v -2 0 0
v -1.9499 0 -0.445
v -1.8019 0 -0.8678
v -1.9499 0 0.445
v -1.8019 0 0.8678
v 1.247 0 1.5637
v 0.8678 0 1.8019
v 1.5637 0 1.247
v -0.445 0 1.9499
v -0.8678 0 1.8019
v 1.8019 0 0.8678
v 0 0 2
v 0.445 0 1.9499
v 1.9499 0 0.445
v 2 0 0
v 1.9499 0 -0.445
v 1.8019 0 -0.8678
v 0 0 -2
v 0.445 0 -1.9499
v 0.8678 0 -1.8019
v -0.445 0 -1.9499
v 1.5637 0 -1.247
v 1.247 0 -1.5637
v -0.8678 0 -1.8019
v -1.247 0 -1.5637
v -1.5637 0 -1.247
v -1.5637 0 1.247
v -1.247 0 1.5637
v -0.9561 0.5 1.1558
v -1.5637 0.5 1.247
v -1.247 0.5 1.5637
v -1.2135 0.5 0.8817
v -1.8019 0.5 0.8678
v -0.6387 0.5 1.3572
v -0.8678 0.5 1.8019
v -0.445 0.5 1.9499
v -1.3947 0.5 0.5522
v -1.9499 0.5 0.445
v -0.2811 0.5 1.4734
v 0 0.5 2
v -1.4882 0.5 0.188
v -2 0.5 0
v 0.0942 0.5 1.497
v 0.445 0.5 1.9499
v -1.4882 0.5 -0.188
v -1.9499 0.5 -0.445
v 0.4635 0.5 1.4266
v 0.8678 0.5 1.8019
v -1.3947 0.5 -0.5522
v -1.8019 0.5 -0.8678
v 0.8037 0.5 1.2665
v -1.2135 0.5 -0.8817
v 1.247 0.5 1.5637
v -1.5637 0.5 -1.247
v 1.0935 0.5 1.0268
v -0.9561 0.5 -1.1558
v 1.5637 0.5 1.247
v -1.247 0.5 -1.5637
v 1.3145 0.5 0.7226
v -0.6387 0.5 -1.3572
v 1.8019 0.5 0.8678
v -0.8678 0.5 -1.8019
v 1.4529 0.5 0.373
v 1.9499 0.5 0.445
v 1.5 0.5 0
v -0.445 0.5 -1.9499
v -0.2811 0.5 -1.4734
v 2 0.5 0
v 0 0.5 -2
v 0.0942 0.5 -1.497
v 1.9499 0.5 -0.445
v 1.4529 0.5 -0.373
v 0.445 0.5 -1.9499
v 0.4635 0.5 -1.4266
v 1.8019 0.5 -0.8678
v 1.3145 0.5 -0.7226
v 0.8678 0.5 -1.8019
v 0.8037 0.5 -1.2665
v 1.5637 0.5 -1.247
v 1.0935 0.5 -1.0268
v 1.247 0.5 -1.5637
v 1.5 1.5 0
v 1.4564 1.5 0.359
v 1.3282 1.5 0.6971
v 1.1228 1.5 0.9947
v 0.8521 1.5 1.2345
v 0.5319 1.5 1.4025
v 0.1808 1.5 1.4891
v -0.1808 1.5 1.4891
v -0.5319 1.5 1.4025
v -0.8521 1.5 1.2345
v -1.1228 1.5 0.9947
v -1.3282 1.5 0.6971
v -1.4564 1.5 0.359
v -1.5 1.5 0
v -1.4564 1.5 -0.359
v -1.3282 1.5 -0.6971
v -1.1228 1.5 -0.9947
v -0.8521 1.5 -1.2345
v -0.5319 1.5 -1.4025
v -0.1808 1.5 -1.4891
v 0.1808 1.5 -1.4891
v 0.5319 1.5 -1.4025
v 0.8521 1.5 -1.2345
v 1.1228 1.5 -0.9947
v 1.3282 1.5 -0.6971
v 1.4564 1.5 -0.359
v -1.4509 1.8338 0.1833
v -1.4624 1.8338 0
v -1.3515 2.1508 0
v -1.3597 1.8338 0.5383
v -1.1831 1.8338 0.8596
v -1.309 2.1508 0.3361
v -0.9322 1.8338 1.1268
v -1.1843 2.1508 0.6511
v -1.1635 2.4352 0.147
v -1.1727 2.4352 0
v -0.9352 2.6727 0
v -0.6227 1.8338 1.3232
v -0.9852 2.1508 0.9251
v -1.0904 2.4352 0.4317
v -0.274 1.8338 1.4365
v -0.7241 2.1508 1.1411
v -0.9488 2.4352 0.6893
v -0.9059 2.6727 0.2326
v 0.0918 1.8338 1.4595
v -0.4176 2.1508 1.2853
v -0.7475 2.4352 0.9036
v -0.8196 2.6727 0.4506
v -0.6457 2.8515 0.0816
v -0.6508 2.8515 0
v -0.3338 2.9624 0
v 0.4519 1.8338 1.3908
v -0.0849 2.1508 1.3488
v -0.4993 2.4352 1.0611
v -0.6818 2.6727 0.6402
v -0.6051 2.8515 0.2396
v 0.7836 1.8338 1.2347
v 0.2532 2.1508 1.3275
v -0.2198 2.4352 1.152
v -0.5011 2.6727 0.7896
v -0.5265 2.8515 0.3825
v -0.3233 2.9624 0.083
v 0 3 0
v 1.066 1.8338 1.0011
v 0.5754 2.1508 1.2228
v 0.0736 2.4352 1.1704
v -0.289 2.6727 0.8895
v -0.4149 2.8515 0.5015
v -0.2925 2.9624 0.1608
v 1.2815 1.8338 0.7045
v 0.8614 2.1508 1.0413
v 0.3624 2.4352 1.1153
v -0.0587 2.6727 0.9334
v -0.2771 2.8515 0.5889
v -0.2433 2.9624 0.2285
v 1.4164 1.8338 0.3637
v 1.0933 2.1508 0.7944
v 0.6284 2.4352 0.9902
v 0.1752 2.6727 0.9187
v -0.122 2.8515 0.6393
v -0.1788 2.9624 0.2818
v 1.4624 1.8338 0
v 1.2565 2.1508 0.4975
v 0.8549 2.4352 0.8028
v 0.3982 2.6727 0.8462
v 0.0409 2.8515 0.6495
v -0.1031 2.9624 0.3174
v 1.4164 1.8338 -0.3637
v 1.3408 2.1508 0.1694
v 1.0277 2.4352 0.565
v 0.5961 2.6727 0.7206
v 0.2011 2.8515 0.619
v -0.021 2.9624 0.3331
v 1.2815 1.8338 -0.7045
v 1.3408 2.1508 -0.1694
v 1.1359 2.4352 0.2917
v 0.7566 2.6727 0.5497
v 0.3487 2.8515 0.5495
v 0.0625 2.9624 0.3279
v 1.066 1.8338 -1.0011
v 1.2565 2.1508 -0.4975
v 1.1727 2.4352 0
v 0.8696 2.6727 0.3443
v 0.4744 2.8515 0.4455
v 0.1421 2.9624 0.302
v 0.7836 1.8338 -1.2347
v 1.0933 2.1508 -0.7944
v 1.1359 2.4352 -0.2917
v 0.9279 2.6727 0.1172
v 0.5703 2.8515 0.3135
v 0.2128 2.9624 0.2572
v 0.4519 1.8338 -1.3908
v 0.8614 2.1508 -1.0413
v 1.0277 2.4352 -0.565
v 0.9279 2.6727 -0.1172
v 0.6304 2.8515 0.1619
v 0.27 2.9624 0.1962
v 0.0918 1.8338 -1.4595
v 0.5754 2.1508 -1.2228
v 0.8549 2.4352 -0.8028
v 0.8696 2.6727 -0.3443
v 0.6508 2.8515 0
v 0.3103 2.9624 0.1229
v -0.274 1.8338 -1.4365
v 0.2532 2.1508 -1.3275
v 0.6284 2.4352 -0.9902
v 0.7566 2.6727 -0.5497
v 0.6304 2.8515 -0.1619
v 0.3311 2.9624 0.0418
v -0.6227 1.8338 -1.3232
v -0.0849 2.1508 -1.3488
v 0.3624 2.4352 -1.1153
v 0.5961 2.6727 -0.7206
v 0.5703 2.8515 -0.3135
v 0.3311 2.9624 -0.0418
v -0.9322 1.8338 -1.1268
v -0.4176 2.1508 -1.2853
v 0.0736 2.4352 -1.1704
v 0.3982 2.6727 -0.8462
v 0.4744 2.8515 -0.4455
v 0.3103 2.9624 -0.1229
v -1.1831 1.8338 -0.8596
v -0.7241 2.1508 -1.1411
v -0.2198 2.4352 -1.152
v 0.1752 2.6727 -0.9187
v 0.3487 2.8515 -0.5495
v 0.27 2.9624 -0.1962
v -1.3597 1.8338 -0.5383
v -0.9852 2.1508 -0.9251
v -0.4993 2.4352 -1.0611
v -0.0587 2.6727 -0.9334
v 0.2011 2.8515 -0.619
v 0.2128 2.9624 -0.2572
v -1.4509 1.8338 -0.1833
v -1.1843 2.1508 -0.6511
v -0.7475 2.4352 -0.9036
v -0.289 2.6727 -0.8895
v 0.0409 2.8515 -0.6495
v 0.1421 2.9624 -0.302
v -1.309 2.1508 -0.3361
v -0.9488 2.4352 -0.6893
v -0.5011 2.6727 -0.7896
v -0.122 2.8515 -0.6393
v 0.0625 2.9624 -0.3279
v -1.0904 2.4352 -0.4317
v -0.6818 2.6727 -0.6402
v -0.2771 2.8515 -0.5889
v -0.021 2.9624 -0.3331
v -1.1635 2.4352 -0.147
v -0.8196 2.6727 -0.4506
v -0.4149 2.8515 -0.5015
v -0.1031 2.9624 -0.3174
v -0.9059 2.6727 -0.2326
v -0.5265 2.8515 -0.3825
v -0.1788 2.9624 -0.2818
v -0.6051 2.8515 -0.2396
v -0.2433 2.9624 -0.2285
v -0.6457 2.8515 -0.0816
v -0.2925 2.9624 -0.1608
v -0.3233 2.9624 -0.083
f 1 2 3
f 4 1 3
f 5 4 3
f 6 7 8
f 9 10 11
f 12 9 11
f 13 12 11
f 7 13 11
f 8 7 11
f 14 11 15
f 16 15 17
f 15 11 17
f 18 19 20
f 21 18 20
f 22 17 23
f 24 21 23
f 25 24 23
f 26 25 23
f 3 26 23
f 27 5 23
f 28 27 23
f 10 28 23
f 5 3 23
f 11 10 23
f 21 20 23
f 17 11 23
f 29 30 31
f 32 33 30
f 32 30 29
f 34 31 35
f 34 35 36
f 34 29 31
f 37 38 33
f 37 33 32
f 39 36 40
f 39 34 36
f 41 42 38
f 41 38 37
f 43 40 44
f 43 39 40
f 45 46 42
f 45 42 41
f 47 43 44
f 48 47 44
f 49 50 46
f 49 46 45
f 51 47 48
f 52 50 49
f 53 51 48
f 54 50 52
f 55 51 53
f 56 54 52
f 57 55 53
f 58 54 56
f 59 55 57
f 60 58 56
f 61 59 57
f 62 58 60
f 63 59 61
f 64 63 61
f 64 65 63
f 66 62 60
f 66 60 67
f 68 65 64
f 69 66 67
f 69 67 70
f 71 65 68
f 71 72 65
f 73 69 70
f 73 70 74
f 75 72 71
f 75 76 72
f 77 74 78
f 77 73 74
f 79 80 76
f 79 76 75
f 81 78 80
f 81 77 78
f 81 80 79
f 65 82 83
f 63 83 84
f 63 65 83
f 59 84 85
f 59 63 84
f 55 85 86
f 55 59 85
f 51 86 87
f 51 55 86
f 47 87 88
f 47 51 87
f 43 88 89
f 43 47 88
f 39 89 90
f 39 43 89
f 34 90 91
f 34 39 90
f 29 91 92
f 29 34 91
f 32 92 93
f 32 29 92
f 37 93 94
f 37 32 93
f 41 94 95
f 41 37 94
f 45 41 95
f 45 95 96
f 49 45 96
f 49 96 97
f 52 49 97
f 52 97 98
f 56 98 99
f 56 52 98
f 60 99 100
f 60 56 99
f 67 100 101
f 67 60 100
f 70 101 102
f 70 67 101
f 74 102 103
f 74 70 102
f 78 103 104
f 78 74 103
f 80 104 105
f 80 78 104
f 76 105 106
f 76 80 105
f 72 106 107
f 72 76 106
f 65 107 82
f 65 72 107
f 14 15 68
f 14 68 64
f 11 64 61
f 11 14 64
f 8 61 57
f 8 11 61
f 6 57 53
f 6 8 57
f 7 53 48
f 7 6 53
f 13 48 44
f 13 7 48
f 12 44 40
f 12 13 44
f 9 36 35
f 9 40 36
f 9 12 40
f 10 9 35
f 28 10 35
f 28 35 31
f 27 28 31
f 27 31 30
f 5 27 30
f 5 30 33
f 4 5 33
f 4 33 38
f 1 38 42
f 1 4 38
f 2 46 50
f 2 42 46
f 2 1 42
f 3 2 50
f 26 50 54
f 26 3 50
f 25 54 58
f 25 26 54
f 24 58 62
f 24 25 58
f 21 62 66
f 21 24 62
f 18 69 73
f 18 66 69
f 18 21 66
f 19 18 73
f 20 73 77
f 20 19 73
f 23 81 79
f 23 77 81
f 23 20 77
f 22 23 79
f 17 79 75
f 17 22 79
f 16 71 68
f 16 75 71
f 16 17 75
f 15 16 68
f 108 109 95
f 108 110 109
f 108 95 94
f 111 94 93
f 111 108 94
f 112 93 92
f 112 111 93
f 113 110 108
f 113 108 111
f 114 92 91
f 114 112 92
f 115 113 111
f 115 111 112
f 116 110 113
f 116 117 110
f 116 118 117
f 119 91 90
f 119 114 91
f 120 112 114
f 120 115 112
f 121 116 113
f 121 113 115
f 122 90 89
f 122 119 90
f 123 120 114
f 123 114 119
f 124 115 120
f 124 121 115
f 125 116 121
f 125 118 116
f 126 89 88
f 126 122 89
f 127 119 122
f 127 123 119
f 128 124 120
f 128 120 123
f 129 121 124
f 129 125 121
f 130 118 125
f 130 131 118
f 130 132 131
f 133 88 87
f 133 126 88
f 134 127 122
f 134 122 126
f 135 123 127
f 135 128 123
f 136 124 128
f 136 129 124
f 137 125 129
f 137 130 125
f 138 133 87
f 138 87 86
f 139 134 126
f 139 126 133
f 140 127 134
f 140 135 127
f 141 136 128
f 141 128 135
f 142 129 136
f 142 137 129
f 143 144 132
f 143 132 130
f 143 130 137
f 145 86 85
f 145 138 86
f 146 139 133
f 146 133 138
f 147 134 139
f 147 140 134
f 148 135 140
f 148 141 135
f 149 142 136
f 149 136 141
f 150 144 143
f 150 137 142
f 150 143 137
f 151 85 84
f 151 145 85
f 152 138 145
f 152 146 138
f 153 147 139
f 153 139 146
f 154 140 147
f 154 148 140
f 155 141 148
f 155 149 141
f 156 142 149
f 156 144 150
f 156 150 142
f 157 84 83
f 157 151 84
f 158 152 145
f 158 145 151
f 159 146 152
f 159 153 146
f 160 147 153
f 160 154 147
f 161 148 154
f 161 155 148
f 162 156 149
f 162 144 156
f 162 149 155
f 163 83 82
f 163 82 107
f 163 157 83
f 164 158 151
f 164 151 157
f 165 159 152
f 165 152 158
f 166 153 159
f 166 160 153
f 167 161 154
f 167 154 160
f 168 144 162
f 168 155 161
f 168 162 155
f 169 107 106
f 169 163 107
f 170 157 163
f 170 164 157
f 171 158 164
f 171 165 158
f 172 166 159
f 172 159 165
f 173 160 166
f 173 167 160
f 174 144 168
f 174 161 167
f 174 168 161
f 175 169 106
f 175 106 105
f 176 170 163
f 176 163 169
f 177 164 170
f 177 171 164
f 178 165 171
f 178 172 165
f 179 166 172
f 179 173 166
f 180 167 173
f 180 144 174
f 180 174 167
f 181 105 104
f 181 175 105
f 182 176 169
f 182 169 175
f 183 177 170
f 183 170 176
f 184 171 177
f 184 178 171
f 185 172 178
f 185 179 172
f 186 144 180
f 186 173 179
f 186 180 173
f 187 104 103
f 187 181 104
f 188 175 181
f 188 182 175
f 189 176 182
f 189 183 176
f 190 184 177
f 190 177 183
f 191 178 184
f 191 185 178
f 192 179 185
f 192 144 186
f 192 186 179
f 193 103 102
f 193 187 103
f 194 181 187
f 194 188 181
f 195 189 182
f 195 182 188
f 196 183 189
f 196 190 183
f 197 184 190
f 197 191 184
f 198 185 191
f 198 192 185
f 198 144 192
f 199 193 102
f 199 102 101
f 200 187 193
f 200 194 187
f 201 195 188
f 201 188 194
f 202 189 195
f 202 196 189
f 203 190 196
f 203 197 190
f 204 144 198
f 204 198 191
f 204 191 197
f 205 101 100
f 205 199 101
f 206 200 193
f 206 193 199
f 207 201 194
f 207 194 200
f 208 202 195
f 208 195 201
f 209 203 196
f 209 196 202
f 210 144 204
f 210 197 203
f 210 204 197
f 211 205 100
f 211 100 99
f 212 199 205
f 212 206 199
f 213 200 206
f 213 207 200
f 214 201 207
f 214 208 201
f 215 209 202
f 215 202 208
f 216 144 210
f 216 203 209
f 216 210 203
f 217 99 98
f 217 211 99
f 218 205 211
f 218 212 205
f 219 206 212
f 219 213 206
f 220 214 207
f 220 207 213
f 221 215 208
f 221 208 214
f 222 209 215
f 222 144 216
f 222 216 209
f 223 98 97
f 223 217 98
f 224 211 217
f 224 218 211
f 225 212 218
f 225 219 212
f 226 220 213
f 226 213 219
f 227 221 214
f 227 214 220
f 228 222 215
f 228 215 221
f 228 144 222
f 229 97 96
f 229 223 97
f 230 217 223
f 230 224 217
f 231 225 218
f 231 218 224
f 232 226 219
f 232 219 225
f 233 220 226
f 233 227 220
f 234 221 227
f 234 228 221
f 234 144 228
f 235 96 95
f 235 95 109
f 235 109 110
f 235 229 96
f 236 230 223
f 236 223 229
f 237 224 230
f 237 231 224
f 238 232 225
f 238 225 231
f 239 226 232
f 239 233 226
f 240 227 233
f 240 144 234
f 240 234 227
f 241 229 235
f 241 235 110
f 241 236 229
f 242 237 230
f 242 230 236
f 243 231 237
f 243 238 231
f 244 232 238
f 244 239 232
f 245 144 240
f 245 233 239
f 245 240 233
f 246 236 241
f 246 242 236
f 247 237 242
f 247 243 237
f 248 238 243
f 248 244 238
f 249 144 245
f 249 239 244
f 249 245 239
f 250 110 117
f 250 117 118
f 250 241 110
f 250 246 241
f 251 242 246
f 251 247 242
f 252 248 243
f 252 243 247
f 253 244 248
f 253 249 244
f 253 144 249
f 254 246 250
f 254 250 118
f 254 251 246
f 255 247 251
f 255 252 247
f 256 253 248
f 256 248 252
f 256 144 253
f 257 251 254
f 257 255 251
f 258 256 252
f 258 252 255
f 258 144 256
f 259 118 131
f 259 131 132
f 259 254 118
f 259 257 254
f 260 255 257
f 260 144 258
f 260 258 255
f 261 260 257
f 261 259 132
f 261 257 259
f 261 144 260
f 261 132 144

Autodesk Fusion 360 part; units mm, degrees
sketch "Sketch1" plane through (0, 0, 0) normal (0, 1, 0) x (1, 0, 0)
  circle A0 centre (0, 0) radius 1.5
  circle A1 centre (0, 0) radius 2
  dimension "d1" = 3
  dimension "d2" = 4
extrude "Extrude1" add sketch "Sketch1" along normal blind 0.5 contours A0 | A1
extrude "Extrude2" add sketch "Sketch1" along normal blind 1.5 contours A0
sphere "SpherePrimitive1" add diameter 3 placed x (-1, 0, 0) y (0, 0, 1) z (0, 1, 0) at (0, 1.5, 0)
